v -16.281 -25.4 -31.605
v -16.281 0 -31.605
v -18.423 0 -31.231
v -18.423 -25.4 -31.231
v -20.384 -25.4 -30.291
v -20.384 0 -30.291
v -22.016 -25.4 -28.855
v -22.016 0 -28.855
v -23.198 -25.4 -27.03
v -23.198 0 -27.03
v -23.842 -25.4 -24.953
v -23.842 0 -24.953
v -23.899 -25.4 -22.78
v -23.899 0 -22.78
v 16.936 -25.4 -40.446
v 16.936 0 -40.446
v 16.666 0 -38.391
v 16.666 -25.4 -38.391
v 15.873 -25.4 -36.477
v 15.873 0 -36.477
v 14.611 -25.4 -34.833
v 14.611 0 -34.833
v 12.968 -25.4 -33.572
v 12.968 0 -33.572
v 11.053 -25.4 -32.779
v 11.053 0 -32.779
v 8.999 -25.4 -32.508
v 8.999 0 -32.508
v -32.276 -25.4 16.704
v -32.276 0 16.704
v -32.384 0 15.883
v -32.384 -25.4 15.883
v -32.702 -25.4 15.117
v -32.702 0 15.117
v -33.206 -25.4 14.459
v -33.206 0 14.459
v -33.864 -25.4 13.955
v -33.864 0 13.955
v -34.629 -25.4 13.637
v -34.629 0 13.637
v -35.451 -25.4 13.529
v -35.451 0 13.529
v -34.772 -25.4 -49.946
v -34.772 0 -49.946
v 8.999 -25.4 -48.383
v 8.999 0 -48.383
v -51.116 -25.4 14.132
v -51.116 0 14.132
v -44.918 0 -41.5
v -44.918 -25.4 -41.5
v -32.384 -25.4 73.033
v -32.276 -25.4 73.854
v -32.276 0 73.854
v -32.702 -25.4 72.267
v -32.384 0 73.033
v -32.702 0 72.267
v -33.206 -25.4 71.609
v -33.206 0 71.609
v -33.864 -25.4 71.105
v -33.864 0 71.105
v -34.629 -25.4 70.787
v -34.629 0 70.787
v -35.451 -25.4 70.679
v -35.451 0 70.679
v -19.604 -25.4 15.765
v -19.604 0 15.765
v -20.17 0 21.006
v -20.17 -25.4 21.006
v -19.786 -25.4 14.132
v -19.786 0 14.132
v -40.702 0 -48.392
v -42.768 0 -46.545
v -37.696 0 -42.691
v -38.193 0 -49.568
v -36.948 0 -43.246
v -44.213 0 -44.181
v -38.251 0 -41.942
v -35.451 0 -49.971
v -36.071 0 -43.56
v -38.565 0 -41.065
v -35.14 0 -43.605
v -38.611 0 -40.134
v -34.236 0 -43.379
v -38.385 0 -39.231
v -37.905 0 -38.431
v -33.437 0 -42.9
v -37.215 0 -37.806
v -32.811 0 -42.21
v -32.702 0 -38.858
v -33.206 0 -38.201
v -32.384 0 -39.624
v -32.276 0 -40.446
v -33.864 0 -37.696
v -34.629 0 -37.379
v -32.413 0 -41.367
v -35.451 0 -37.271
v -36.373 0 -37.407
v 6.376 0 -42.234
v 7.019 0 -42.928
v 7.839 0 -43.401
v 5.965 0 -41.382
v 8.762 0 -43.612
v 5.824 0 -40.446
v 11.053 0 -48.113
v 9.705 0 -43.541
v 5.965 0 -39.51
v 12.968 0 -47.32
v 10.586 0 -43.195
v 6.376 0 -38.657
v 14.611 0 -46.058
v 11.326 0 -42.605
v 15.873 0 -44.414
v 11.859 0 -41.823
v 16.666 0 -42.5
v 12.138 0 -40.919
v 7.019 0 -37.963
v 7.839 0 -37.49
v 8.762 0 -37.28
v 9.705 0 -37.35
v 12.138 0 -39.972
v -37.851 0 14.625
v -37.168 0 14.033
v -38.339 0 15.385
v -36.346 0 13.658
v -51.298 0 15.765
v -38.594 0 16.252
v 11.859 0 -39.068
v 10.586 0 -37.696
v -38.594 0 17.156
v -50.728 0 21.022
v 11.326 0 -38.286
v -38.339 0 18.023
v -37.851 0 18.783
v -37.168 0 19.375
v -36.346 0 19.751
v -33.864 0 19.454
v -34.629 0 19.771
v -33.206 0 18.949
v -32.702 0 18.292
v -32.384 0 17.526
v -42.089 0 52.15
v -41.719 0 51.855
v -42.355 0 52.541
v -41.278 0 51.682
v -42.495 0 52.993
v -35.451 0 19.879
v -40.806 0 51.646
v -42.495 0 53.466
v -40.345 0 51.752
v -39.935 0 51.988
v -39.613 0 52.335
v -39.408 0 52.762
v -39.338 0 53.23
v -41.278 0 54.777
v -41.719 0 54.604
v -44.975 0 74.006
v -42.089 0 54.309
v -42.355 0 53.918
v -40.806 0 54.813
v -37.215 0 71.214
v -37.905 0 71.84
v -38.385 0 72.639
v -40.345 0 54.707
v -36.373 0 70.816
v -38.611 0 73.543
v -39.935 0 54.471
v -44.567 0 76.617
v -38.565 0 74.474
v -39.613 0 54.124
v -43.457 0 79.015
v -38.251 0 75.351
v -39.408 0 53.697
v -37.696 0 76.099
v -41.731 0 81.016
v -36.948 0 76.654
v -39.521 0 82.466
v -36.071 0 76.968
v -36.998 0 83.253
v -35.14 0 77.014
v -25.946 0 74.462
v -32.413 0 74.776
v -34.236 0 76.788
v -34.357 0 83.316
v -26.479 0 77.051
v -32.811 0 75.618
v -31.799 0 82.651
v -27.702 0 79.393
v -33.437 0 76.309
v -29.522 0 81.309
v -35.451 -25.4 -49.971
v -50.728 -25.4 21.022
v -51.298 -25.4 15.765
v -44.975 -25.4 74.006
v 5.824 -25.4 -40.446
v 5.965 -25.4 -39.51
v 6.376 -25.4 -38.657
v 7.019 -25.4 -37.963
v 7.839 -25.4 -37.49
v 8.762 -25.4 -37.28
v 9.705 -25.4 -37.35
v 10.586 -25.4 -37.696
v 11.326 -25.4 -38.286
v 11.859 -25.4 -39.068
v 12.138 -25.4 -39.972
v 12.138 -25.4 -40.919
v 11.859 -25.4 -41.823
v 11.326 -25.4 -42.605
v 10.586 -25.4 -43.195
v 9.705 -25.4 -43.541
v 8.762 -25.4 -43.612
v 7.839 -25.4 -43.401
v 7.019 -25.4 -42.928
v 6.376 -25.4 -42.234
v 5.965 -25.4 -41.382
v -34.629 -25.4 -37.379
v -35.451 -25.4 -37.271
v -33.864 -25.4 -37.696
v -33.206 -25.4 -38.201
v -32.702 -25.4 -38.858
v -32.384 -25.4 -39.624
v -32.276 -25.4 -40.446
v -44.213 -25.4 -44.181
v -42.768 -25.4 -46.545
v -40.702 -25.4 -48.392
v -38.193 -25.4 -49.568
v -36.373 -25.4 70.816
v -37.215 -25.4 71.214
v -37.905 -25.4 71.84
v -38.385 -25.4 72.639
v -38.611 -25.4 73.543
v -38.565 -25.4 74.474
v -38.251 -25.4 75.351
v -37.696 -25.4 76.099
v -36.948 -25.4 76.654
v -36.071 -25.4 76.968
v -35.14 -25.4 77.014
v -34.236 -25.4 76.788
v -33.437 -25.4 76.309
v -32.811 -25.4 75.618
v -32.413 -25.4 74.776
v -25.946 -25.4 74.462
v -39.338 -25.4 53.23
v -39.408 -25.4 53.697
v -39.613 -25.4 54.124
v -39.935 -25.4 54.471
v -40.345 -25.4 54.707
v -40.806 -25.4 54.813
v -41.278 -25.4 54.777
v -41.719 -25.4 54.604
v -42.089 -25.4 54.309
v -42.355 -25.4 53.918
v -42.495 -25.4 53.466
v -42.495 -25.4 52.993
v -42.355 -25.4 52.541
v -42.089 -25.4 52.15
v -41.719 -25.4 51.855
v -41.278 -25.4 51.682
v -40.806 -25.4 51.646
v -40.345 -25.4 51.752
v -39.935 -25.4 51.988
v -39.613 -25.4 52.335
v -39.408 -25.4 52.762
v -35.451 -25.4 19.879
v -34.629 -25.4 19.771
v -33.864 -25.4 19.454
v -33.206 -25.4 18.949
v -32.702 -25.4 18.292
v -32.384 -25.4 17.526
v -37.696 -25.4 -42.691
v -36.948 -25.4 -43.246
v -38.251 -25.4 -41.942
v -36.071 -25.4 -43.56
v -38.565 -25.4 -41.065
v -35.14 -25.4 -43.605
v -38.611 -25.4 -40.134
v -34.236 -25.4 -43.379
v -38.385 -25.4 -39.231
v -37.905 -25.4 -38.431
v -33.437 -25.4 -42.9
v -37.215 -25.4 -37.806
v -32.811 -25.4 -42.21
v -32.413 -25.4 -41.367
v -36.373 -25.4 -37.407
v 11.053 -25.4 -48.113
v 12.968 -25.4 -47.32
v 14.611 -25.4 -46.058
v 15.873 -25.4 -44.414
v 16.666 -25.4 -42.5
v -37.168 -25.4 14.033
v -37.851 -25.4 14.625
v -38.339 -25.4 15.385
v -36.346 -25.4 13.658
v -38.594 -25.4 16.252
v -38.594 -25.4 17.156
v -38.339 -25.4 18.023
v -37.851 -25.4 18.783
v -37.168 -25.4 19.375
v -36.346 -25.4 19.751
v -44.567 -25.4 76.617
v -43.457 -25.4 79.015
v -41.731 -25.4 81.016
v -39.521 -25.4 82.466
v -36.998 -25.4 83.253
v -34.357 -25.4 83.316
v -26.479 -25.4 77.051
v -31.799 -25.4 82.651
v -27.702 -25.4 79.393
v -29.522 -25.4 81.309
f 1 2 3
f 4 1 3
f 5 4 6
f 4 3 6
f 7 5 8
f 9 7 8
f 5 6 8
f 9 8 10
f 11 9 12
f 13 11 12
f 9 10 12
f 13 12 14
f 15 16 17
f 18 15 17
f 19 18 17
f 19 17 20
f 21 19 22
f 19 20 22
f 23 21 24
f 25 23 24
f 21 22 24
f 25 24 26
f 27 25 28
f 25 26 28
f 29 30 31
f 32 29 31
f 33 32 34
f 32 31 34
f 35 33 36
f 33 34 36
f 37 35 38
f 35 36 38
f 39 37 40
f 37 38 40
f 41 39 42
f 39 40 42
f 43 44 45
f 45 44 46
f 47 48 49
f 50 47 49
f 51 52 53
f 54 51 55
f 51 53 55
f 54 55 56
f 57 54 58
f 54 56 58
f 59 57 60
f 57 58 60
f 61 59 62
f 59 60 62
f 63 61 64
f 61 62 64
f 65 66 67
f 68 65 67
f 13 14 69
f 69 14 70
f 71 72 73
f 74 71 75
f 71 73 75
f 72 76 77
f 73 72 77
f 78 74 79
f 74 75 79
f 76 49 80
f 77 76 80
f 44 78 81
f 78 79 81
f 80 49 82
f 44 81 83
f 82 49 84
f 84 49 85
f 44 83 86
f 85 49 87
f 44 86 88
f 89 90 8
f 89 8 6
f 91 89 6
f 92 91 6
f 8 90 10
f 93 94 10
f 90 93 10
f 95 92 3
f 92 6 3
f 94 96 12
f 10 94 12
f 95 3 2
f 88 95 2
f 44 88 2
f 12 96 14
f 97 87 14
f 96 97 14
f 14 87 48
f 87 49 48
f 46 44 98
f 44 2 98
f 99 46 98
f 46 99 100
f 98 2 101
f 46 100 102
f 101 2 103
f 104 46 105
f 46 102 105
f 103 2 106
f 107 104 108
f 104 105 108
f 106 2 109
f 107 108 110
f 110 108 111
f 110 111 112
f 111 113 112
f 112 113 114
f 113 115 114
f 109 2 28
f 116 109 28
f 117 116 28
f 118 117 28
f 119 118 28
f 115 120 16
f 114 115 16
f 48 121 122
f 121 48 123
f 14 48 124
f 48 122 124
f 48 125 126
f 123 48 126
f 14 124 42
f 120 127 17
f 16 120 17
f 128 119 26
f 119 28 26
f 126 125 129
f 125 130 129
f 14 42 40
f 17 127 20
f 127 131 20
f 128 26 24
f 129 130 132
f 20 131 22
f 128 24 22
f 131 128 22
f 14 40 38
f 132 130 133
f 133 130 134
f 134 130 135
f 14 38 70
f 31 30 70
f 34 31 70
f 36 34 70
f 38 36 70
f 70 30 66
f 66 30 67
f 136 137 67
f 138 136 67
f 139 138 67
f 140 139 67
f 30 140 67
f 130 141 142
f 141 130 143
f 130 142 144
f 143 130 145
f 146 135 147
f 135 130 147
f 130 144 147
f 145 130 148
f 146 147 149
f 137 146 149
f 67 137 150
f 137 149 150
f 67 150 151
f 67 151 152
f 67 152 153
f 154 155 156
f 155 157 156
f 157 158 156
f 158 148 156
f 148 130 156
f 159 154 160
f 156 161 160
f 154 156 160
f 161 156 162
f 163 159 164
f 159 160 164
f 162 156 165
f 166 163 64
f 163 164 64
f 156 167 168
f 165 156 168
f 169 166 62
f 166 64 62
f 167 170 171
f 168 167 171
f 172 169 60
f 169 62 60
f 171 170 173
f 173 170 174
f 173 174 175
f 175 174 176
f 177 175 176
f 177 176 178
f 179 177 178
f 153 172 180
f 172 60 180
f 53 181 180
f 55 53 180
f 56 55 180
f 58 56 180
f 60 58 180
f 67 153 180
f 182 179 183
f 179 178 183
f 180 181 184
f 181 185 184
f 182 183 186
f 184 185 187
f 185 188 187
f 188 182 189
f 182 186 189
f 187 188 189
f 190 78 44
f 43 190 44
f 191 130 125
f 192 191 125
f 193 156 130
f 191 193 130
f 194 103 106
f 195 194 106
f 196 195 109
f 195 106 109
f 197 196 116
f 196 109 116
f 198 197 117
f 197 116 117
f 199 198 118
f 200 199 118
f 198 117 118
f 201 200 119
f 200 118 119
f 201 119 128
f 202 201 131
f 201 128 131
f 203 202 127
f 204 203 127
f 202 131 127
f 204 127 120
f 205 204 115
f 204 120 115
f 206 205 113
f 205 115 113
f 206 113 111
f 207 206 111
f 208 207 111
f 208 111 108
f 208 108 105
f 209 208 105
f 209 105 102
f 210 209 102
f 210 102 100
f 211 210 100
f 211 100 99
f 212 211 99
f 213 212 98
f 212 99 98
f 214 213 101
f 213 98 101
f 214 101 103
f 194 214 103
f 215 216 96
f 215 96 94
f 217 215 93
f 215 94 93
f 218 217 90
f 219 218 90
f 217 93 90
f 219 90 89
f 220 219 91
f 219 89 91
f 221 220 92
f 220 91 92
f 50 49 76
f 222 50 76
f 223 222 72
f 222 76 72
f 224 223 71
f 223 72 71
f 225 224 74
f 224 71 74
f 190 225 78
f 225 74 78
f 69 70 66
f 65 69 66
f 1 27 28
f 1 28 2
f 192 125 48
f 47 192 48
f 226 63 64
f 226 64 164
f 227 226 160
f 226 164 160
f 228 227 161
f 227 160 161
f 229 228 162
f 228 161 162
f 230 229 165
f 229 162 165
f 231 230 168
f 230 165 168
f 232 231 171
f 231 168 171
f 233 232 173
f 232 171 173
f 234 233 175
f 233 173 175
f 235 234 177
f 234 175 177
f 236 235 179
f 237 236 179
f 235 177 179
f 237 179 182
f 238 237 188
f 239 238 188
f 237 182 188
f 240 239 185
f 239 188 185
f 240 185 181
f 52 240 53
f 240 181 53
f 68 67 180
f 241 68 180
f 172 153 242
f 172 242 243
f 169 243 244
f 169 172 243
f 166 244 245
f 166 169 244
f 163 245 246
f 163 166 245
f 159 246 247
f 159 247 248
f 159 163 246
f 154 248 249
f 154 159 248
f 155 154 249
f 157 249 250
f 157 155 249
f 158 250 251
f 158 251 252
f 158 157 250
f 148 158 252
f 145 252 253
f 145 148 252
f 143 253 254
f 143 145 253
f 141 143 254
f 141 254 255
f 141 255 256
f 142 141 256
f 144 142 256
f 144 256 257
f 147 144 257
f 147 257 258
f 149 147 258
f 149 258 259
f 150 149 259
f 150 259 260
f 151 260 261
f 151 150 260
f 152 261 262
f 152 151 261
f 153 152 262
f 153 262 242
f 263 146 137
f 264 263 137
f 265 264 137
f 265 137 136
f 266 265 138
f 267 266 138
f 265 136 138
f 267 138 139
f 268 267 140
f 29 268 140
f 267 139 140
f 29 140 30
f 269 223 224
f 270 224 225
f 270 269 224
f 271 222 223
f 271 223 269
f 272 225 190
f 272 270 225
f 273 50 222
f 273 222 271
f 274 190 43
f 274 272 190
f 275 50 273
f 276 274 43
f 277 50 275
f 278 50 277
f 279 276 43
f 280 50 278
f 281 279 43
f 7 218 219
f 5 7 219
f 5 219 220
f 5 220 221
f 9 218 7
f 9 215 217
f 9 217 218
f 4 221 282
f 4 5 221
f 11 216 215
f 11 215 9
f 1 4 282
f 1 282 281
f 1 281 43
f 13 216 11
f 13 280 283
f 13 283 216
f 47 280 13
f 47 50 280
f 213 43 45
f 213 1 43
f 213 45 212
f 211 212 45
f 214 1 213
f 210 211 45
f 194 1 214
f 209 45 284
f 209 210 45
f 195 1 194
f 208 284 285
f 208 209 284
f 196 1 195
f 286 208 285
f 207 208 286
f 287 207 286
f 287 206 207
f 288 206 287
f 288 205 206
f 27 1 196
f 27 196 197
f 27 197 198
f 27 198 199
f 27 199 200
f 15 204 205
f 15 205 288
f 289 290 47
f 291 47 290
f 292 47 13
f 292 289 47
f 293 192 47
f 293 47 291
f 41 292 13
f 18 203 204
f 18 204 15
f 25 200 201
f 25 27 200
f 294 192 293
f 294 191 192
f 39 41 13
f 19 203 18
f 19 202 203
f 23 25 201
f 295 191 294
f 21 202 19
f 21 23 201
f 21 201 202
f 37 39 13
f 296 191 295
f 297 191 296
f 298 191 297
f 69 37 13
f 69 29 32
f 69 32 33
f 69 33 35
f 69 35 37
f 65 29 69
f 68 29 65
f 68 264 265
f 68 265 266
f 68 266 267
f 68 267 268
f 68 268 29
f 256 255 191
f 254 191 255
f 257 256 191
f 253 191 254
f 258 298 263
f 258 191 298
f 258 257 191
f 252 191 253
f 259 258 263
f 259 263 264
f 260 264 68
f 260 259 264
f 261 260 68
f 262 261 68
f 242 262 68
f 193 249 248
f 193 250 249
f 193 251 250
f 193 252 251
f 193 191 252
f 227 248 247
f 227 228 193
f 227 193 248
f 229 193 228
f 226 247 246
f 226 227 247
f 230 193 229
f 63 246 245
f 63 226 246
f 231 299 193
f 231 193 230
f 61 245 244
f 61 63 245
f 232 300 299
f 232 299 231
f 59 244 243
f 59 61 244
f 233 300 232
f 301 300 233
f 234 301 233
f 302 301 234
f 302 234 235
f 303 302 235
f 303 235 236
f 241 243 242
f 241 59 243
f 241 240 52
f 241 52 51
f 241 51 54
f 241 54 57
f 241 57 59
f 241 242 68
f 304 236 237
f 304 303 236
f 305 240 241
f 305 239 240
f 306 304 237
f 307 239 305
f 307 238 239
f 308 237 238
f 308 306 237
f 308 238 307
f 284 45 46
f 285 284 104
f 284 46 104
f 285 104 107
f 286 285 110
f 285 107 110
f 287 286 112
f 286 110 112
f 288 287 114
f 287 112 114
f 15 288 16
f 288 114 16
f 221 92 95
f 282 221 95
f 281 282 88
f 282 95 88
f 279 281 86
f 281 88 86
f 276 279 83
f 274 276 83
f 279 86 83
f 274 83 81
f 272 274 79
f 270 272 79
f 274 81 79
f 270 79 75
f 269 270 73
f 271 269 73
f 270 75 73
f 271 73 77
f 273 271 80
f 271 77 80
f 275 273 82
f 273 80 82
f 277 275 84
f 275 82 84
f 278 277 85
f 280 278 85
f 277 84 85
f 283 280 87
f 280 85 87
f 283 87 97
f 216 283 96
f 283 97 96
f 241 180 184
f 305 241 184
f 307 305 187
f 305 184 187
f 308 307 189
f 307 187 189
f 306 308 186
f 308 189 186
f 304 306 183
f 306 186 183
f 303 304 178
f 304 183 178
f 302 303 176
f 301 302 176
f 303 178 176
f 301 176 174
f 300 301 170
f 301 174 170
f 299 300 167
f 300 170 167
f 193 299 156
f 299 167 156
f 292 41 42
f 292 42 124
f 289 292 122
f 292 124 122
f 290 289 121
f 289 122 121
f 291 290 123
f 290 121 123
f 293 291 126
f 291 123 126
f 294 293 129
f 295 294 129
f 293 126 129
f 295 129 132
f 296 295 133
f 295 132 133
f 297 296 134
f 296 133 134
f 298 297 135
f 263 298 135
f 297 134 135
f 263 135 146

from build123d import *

# Parameters (mm, degrees)
F0_R     = 1.5875
F1_DEPTH = 25.4


with BuildPart() as f1:
    # F0 (on Front) → F1 (new body)
    with BuildSketch(Plane.XZ):
        with BuildLine():
            ThreePointArc((-44.9749847751, 74.0057436376), (-42.239710519, 67.1728704693), (-35.4511886835, 64.3293071628))
            ThreePointArc((-35.4511886835, 64.3293071628), (-28.7159965927, 67.119115072), (-25.9261886835, 73.8543071628))
            ThreePointArc((-25.9261886835, 73.8543071628), (-25.931047818, 74.1585158089), (-25.9456202636, 74.4624140737))
            ThreePointArc((-25.9456202636, 74.4624140737), (-35.6797057153, 83.3765655591), (-44.9749847751, 74.0057436376))
        make_face()
        with BuildLine():
            ThreePointArc((-32.2761886835, 73.8543071628), (-33.2061246532, 71.6092431325), (-35.4511886835, 70.6793071628))
            ThreePointArc((-35.4511886835, 70.6793071628), (-37.6962527138, 76.099371193), (-32.2761886835, 73.8543071628))
        make_face(mode=Mode.SUBTRACT)
        with BuildLine():
            ThreePointArc((-25.9261886835, 73.8543071628), (-28.7159965927, 67.119115072), (-35.4511886835, 64.3293071628))
            Line((-35.4511886835, 64.3293071628), (-35.4511886835, 32.5793071628))
            ThreePointArc((-35.4511886835, 32.5793071628), (-25.8667813668, 29.3595338058), (-20.1702001062, 21.0062849753))
            Line((-20.1702001062, 21.0062849753), (-25.9456202636, 74.4624140737))
            ThreePointArc((-25.9456202636, 74.4624140737), (-25.931047818, 74.1585158089), (-25.9261886835, 73.8543071628))
        make_face()
        with BuildLine():
            Line((-35.4511886835, 32.5793071628), (-35.4511886835, 64.3293071628))
            ThreePointArc((-35.4511886835, 64.3293071628), (-42.239710519, 67.1728704693), (-44.9749847751, 74.0057436376))
            Line((-44.9749847751, 74.0057436376), (-50.7276259168, 21.0224190715))
            ThreePointArc((-50.7276259168, 21.0224190715), (-45.0289127986, 29.3645925377), (-35.4511886835, 32.5793071628))
        make_face()
        with Locations((-40.9250855446, 53.2295071628)):
            Circle(F0_R, mode=Mode.SUBTRACT)
        with BuildLine():
            ThreePointArc((-20.1702001062, 21.0062849753), (-25.8667813668, 29.3595338058), (-35.4511886835, 32.5793071628))
            Line((-35.4511886835, 32.5793071628), (-35.4511886835, 19.8793071628))
            ThreePointArc((-35.4511886835, 19.8793071628), (-33.2061246532, 18.949371193), (-32.2761886835, 16.7043071628))
            ThreePointArc((-32.2761886835, 16.7043071628), (-33.2061246532, 14.4592431325), (-35.4511886835, 13.5293071628))
            Line((-35.4511886835, 13.5293071628), (-35.4511886835, 0.8293071628))
            ThreePointArc((-35.4511886835, 0.8293071628), (-25.1755047485, 4.6036483101), (-19.7859860662, 14.131944055))
            Line((-19.7859860662, 14.131944055), (-19.6039763716, 15.7654318029))
            Line((-19.6039763716, 15.7654318029), (-20.1702001062, 21.0062849753))
        make_face()
        with BuildLine():
            Line((-35.4511886835, 19.8793071628), (-35.4511886835, 32.5793071628))
            ThreePointArc((-35.4511886835, 32.5793071628), (-45.0289127986, 29.3645925377), (-50.7276259168, 21.0224190715))
            Line((-50.7276259168, 21.0224190715), (-51.2984009954, 15.7654318029))
            Line((-51.2984009954, 15.7654318029), (-51.1163913008, 14.131944055))
            ThreePointArc((-51.1163913008, 14.131944055), (-45.7268726185, 4.6036483101), (-35.4511886835, 0.8293071628))
            Line((-35.4511886835, 0.8293071628), (-35.4511886835, 13.5293071628))
            ThreePointArc((-35.4511886835, 13.5293071628), (-38.6261886835, 16.7043071628), (-35.4511886835, 19.8793071628))
        make_face()
        with BuildLine():
            ThreePointArc((-19.7859860662, 14.131944055), (-25.1755047485, 4.6036483101), (-35.4511886835, 0.8293071628))
            Line((-35.4511886835, 0.8293071628), (-35.4511886835, -30.9206928372))
            ThreePointArc((-35.4511886835, -30.9206928372), (-28.7159965927, -33.7105007464), (-25.9261886835, -40.4456928372))
            Line((-25.9261886835, -40.4456928372), (1.0613113165, -40.4456928372))
            ThreePointArc((1.0613113165, -40.4456928372), (3.3861512408, -34.8330327616), (8.9988113165, -32.5081928372))
            Line((8.9988113165, -32.5081928372), (-16.2812915947, -31.605332019))
            ThreePointArc((-16.2812915947, -31.605332019), (-22.0159487809, -28.8548482736), (-23.8988395601, -22.7798029084))
            Line((-23.8988395601, -22.7798029084), (-19.7859860662, 14.131944055))
        make_face()
        with BuildLine():
            Line((-35.4511886835, -30.9206928372), (-35.4511886835, 0.8293071628))
            ThreePointArc((-35.4511886835, 0.8293071628), (-45.7268726185, 4.6036483101), (-51.1163913008, 14.131944055))
            Line((-51.1163913008, 14.131944055), (-44.9176057417, -41.5004786351))
            ThreePointArc((-44.9176057417, -41.5004786351), (-42.5495145328, -34.0943626508), (-35.4511886835, -30.9206928372))
        make_face()
        with BuildLine():
            ThreePointArc((-25.9261886835, -40.4456928372), (-28.7159965927, -33.7105007464), (-35.4511886835, -30.9206928372))
            Line((-35.4511886835, -30.9206928372), (-35.4511886835, -37.2706928372))
            ThreePointArc((-35.4511886835, -37.2706928372), (-33.2061246532, -38.200628807), (-32.2761886835, -40.4456928372))
            Line((-32.2761886835, -40.4456928372), (-25.9261886835, -40.4456928372))
        make_face()
        with BuildLine():
            Line((-35.4511886835, -37.2706928372), (-35.4511886835, -30.9206928372))
            ThreePointArc((-35.4511886835, -30.9206928372), (-42.5495145328, -34.0943626508), (-44.9176057417, -41.5004786351))
            ThreePointArc((-44.9176057417, -41.5004786351), (-41.80251887, -47.5440186865), (-35.4511886835, -49.9706928372))
            Line((-35.4511886835, -49.9706928372), (-34.7716982376, -49.9464253213))
            ThreePointArc((-34.7716982376, -49.9464253213), (-28.4798985771, -46.9362043157), (-25.9261886835, -40.4456928372))
            Line((-25.9261886835, -40.4456928372), (-32.2761886835, -40.4456928372))
            ThreePointArc((-32.2761886835, -40.4456928372), (-37.6962527138, -42.6907568675), (-35.4511886835, -37.2706928372))
        make_face()
        with BuildLine():
            Line((1.0613113165, -40.4456928372), (-25.9261886835, -40.4456928372))
            ThreePointArc((-25.9261886835, -40.4456928372), (-28.4798985771, -46.9362043157), (-34.7716982376, -49.9464253213))
            Line((-34.7716982376, -49.9464253213), (8.9988113165, -48.3831928372))
            ThreePointArc((8.9988113165, -48.3831928372), (3.3861512408, -46.0583529129), (1.0613113165, -40.4456928372))
        make_face()
        with BuildLine():
            ThreePointArc((8.9988113165, -32.5081928372), (3.3861512408, -34.8330327616), (1.0613113165, -40.4456928372))
            ThreePointArc((1.0613113165, -40.4456928372), (3.3861512408, -46.0583529129), (8.9988113165, -48.3831928372))
            ThreePointArc((8.9988113165, -48.3831928372), (14.6114713922, -46.0583529129), (16.9363113165, -40.4456928372))
            ThreePointArc((16.9363113165, -40.4456928372), (14.6114713922, -34.8330327616), (8.9988113165, -32.5081928372))
        make_face()
        with BuildLine():
            ThreePointArc((12.1738113165, -40.4456928372), (8.9988113165, -43.6206928372), (5.8238113165, -40.4456928372))
            ThreePointArc((5.8238113165, -40.4456928372), (8.9988113165, -37.2706928372), (12.1738113165, -40.4456928372))
        make_face(mode=Mode.SUBTRACT)
    extrude(amount=F1_DEPTH)


solid = f1.part
